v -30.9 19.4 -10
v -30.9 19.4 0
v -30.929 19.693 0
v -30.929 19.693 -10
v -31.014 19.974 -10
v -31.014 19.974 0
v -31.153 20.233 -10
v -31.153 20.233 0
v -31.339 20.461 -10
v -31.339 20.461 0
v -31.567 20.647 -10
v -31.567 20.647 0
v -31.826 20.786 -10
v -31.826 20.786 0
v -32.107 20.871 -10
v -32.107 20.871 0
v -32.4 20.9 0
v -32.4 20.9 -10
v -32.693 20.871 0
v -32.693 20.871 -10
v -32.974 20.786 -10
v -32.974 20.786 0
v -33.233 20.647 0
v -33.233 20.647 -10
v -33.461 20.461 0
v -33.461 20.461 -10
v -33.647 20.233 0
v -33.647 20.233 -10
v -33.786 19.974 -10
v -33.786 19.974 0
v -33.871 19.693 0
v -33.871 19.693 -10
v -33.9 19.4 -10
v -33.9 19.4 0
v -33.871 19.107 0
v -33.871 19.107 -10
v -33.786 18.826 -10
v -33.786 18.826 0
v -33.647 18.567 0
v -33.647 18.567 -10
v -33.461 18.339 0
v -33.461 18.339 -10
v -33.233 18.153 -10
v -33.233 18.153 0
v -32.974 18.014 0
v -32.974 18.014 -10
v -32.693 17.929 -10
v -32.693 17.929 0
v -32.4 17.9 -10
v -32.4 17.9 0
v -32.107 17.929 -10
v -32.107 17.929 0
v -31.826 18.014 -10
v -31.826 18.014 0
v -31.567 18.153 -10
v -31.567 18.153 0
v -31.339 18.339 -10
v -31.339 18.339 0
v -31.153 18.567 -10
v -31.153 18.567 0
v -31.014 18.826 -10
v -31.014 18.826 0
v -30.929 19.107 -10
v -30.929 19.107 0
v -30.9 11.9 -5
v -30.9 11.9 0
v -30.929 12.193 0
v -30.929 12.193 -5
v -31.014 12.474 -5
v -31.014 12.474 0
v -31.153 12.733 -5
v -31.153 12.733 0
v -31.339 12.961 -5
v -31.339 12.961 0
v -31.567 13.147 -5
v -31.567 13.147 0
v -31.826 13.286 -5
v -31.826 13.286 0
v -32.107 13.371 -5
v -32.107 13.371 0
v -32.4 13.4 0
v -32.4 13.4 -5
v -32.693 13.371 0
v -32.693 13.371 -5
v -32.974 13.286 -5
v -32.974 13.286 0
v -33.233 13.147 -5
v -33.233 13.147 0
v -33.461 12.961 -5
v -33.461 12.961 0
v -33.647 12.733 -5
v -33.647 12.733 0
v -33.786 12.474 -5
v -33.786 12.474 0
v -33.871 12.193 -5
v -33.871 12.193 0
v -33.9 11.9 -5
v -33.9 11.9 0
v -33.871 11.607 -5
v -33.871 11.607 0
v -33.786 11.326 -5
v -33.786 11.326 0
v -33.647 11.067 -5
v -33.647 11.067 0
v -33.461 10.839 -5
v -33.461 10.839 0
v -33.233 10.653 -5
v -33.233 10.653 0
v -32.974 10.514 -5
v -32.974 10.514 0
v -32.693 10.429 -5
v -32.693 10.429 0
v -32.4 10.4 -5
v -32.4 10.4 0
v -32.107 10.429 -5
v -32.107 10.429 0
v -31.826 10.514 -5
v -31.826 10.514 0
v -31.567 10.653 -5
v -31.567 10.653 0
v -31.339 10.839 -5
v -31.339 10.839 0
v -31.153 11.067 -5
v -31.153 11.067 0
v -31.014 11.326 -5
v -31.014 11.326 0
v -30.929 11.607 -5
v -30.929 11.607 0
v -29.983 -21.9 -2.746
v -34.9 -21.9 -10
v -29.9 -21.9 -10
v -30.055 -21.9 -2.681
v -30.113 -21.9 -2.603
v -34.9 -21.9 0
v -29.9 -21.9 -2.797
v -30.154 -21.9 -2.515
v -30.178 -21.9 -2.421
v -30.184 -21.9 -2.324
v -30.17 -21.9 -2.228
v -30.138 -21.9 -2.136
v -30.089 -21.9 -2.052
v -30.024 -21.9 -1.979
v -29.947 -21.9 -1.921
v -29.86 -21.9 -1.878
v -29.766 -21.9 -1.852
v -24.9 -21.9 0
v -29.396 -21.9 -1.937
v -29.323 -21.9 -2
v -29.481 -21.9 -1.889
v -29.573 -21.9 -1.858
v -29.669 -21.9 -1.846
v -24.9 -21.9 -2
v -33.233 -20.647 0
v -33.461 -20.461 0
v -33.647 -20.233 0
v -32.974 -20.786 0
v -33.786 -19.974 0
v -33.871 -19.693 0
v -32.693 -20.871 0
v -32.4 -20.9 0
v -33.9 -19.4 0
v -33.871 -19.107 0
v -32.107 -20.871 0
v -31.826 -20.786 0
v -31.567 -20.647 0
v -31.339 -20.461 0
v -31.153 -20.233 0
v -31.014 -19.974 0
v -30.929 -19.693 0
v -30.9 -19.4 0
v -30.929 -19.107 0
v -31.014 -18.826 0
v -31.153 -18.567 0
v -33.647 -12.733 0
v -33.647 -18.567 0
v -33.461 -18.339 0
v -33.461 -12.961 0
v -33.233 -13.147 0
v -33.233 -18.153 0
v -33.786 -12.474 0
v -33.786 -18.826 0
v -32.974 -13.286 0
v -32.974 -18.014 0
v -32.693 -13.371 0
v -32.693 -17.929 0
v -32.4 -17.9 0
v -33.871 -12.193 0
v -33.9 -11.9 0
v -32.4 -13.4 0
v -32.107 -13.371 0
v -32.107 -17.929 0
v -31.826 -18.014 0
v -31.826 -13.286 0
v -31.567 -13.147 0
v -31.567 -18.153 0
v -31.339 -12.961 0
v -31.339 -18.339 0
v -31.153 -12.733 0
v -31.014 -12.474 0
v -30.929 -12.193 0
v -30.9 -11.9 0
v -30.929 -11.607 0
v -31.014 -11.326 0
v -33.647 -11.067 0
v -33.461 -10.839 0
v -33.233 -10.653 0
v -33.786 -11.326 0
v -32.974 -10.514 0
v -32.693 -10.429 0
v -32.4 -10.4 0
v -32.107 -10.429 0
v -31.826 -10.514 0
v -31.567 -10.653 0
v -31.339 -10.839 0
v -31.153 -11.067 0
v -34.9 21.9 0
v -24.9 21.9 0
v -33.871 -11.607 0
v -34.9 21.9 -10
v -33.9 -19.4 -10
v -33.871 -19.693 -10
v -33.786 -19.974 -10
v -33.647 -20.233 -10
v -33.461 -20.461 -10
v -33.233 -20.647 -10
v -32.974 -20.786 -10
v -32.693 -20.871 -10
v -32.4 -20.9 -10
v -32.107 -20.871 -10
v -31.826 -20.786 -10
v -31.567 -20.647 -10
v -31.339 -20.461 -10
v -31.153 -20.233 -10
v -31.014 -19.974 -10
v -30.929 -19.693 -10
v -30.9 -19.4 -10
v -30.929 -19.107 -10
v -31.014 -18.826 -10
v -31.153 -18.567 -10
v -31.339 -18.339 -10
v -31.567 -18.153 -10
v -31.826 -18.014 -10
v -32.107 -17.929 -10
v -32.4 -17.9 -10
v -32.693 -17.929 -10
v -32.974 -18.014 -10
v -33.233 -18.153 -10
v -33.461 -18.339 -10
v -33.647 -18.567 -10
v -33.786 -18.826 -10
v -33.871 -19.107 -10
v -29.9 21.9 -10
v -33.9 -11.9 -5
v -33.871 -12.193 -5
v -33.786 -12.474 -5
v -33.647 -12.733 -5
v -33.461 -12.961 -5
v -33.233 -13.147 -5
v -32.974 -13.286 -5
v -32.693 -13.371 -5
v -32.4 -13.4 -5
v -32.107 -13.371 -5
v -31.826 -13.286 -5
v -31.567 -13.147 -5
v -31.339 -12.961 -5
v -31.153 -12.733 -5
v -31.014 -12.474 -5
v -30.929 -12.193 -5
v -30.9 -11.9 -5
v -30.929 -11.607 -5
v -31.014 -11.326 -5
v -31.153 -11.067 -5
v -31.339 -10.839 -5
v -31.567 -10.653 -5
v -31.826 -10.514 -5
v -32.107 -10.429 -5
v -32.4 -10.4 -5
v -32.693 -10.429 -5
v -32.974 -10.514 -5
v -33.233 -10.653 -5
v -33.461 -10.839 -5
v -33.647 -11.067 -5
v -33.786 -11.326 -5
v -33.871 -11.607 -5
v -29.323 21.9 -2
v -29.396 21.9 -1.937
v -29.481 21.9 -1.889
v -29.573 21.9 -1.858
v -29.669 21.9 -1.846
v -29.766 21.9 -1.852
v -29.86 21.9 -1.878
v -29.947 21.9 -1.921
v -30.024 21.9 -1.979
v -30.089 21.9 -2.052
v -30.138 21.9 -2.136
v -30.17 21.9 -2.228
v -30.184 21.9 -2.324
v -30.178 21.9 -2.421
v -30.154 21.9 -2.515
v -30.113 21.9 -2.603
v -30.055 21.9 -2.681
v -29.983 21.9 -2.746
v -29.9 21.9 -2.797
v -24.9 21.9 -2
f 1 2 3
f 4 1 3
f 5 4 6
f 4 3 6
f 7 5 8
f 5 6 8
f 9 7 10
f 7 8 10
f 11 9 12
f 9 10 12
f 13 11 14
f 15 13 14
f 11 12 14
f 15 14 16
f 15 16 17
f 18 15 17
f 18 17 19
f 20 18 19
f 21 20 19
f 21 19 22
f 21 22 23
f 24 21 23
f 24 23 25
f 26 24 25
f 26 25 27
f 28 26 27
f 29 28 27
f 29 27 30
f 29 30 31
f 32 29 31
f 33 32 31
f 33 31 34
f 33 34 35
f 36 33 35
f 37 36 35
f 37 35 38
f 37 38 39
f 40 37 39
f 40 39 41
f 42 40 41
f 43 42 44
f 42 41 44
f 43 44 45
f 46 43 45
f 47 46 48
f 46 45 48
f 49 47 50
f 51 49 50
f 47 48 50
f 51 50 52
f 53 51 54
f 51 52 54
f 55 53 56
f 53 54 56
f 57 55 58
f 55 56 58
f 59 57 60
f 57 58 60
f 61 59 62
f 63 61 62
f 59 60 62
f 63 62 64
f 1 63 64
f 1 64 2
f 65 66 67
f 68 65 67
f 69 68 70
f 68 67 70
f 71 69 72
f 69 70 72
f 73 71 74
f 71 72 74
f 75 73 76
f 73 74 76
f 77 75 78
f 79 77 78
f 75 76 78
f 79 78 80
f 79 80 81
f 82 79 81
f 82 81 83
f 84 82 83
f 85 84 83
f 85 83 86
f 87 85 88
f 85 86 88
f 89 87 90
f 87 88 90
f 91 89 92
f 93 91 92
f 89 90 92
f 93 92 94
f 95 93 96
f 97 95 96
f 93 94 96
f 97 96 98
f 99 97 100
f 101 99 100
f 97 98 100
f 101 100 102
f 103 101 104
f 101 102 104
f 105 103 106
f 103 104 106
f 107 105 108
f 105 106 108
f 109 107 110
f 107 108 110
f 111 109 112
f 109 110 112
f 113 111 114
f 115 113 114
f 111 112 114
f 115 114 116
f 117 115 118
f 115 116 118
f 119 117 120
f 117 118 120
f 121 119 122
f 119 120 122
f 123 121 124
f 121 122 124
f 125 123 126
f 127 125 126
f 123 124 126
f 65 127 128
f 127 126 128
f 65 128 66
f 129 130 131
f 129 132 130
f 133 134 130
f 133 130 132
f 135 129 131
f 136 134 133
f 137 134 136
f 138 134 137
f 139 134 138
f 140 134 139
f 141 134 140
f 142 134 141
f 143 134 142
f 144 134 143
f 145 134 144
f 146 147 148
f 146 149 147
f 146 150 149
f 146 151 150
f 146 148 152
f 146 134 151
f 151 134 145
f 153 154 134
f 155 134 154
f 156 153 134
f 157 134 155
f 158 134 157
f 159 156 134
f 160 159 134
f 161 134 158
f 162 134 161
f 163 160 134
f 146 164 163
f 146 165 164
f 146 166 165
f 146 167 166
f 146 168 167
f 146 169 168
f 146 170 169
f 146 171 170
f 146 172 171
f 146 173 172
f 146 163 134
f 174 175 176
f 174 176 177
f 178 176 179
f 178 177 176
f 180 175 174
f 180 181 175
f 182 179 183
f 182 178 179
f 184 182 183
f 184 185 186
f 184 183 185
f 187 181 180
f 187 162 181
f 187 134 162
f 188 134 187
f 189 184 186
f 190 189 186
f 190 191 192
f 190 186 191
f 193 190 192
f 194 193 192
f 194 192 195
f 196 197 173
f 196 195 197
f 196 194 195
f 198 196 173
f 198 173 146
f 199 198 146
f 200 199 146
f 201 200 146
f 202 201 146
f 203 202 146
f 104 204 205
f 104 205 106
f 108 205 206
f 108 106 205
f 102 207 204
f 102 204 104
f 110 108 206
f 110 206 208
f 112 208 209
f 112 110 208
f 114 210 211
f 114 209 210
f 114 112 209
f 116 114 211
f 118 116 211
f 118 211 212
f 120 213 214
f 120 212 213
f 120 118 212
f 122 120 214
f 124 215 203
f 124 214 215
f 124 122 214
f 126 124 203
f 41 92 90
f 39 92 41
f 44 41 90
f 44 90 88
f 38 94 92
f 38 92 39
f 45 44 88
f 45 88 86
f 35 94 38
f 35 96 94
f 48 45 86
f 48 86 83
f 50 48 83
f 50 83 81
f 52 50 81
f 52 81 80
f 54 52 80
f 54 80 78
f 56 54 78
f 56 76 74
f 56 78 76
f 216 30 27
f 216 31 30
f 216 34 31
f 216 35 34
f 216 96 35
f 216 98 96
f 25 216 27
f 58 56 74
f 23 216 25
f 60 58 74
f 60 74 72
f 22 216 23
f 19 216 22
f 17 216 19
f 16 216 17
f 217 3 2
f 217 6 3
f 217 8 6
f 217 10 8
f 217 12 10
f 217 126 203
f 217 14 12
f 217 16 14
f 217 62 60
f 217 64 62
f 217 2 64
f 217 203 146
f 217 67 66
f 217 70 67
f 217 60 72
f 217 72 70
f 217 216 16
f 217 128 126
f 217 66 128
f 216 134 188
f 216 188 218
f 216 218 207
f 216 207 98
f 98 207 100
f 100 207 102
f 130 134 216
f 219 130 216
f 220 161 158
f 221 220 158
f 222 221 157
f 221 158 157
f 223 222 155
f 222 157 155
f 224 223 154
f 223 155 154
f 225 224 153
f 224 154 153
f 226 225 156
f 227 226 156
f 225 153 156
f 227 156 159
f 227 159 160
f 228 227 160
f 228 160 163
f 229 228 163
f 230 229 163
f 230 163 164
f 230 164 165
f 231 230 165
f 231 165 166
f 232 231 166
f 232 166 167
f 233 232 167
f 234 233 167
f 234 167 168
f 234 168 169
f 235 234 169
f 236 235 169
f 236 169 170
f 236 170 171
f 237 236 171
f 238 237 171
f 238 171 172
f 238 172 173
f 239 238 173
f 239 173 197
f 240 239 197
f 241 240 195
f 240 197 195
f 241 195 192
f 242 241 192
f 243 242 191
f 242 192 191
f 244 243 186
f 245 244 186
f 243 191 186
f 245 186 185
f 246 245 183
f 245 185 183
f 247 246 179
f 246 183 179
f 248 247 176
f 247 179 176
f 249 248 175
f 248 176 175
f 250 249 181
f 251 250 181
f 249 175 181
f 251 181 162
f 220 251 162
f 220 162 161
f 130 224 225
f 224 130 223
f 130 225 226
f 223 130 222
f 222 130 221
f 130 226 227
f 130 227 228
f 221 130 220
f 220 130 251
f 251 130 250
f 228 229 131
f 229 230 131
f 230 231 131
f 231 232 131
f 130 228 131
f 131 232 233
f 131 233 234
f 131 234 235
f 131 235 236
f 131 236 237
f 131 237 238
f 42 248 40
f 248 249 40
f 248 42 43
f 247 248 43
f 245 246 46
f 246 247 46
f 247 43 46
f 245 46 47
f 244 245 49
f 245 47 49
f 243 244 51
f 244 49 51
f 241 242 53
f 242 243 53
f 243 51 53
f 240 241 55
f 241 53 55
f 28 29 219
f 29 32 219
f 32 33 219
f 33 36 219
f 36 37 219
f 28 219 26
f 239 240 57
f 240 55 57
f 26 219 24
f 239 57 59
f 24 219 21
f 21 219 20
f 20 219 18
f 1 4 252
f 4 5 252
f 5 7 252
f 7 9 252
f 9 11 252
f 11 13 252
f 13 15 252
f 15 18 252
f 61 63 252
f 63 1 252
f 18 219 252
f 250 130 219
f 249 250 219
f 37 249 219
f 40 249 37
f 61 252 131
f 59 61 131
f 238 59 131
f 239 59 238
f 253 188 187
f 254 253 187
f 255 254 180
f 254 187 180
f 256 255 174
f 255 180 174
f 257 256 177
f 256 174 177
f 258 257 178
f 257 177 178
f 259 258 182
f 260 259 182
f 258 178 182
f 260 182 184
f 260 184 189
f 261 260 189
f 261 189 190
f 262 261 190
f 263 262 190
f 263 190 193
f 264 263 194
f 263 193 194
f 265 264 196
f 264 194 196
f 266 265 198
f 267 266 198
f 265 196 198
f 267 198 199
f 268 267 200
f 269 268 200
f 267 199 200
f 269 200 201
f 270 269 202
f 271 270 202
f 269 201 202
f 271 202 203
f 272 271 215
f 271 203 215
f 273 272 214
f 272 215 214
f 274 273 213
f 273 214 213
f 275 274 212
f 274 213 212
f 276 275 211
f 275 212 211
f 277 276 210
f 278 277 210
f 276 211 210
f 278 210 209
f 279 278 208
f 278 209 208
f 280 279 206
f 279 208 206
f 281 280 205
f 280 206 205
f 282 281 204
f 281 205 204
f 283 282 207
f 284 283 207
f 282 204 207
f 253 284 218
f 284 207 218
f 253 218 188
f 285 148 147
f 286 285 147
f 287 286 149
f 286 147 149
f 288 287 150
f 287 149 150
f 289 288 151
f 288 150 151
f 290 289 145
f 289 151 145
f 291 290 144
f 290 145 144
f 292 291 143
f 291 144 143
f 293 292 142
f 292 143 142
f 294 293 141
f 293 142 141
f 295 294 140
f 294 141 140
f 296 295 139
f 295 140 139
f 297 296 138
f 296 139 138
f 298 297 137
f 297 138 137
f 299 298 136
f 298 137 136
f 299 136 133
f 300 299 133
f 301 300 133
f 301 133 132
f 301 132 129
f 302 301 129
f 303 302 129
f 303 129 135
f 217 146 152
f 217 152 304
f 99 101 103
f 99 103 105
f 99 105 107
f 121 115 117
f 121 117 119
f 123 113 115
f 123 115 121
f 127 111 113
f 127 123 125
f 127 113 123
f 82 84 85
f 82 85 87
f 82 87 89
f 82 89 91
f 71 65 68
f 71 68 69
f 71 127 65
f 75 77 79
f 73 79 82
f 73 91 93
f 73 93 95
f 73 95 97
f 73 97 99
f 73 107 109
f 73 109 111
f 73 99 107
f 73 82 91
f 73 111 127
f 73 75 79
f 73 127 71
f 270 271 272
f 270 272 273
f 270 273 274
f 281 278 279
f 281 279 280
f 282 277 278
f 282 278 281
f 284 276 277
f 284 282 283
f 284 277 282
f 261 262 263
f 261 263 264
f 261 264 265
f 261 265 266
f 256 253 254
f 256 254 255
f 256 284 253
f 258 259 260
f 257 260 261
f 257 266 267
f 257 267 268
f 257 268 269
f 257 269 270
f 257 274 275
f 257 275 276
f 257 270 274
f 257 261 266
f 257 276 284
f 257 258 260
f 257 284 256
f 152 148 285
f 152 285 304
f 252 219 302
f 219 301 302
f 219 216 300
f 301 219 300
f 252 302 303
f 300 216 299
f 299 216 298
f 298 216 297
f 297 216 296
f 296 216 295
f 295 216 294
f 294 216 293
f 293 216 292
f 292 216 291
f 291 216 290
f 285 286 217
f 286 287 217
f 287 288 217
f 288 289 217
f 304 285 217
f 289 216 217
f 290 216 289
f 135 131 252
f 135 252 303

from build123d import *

# Parameters (mm, degrees)
SKETCH_1_W          = 10
SKETCH_1_H          = 43.8
EXTRUDE_1_DEPTH     = 10
SKETCH_2_R          = 0.5
SKETCH_2_W          = 5
SKETCH_2_H          = 8
CUT_EXTRUDE_1_DEPTH = 57.889805765
SKETCH_3_R          = 1.5
CUT_EXTRUDE_2_DEPTH = 43.398349024
SKETCH_4_R          = 1.5
CUT_EXTRUDE_3_DEPTH = 5


with BuildPart() as part:
    # 草圖1 → 填料-伸長1 (new body)
    with BuildSketch(Plane.XY):
        with Locations((-29.9, 0)):
            Rectangle(SKETCH_1_W, SKETCH_1_H)
    extrude(amount=-EXTRUDE_1_DEPTH)

    # 草圖2 → 除料-伸長1 (cut, through all)
    with BuildSketch(Plane.XZ.offset(21.9)):
        with Locations((-29.683988881, -2.34561779)):
            Circle(SKETCH_2_R)
        with Locations((-27.4, -6)):
            Rectangle(SKETCH_2_W, SKETCH_2_H)
    extrude(amount=-CUT_EXTRUDE_1_DEPTH, mode=Mode.SUBTRACT)

    # 草圖3 → 除料-伸長2 (cut, through all)
    with BuildSketch(Plane.XY):
        with Locations((-32.4, 19.4)):
            Circle(SKETCH_3_R)
        with Locations(Location((-32.4, -19.4, 0), (0, 0, 180))):
            Circle(SKETCH_3_R)
    extrude(amount=-CUT_EXTRUDE_2_DEPTH, mode=Mode.SUBTRACT)

    # 草圖4 → 除料-伸長3 (cut)
    with BuildSketch(Plane.XY):
        with Locations((-32.4, 11.9)):
            Circle(SKETCH_4_R)
        with Locations(Location((-32.4, -11.9, 0), (0, 0, 180))):
            Circle(SKETCH_4_R)
    extrude(amount=-CUT_EXTRUDE_3_DEPTH, mode=Mode.SUBTRACT)


solid = part.part
